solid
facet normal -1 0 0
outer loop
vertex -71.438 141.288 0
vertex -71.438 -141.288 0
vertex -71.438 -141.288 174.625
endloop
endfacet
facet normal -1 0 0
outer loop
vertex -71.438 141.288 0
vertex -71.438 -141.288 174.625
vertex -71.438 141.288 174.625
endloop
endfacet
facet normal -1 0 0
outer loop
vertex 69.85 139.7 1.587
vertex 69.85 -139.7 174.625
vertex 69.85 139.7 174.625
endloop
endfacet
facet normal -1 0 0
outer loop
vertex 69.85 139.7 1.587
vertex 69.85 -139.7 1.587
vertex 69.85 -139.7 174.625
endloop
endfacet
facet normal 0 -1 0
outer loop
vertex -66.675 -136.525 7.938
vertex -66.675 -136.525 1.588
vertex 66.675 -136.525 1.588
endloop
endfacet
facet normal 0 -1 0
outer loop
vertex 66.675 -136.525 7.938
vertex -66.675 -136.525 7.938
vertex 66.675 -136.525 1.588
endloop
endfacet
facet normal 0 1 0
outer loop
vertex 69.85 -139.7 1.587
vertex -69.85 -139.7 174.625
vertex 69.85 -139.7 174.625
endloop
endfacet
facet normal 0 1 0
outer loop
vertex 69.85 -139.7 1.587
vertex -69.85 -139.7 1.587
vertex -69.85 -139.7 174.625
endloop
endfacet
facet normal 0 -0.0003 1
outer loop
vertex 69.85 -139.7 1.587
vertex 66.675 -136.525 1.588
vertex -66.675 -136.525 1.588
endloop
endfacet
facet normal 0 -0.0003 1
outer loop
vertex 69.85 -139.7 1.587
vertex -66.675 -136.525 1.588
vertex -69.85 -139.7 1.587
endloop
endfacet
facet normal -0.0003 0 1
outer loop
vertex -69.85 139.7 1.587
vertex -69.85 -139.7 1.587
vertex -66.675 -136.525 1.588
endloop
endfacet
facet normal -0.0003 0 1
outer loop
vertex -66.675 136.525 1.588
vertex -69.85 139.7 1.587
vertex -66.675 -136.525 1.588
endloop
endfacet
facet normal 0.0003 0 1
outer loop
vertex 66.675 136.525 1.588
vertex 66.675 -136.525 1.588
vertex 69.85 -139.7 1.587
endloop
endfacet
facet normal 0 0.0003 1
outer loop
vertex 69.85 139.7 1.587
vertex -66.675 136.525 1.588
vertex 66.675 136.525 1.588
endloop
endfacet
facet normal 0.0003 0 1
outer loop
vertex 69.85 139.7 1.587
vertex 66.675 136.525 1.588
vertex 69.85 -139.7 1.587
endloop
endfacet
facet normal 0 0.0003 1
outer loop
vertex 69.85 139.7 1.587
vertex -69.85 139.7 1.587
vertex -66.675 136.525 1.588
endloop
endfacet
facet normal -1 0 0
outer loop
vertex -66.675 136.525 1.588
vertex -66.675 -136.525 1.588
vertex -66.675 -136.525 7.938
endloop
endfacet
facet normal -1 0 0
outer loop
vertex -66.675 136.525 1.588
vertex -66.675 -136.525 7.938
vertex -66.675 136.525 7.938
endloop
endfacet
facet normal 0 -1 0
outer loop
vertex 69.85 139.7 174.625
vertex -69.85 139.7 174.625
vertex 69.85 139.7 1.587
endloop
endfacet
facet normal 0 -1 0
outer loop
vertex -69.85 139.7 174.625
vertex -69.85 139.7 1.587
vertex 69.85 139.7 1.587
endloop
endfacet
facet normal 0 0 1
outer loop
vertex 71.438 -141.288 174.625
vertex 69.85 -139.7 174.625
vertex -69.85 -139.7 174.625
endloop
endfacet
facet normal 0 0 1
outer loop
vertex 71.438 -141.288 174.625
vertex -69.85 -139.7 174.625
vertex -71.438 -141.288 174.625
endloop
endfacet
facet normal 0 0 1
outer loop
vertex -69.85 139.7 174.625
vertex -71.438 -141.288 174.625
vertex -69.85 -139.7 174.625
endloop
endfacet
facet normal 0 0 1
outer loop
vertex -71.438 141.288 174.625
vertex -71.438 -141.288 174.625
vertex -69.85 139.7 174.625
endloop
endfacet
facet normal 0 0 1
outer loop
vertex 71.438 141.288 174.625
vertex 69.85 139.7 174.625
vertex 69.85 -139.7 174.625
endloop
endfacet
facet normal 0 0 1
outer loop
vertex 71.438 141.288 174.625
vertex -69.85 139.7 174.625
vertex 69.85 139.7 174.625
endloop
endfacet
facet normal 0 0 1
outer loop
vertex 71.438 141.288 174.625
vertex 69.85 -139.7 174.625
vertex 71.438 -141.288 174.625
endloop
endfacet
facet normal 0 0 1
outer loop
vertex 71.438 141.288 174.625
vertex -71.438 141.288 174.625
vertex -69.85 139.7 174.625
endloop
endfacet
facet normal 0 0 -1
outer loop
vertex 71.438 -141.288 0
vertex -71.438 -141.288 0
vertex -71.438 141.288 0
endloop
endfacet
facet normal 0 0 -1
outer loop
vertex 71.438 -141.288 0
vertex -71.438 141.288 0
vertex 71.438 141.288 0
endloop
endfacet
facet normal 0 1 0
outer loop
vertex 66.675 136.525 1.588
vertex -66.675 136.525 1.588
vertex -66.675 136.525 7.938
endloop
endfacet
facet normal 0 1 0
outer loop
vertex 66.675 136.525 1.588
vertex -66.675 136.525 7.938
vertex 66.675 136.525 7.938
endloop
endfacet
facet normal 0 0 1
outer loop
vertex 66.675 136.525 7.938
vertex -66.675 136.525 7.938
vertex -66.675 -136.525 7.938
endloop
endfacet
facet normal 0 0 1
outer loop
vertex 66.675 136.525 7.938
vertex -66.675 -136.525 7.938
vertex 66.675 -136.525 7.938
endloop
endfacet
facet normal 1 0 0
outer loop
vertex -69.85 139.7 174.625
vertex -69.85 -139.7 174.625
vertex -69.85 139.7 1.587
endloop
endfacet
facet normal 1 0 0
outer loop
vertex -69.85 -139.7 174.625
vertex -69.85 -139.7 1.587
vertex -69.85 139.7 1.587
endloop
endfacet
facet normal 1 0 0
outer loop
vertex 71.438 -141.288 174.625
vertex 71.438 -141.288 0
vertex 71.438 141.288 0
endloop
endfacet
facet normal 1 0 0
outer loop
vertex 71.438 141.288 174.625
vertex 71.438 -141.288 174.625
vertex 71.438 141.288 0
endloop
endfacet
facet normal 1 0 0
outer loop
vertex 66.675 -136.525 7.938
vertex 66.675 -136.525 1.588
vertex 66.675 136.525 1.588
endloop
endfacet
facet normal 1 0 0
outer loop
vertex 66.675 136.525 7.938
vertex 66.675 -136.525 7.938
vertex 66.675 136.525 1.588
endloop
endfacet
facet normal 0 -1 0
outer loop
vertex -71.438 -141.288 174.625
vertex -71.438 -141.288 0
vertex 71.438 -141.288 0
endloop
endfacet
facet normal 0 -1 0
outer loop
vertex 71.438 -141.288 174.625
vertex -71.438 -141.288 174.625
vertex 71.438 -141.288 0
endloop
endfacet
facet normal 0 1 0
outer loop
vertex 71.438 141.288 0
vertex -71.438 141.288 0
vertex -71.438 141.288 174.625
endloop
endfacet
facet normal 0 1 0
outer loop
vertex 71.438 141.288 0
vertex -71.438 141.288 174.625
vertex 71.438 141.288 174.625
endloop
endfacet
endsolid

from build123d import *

# Parameters (mm, degrees)
F0_W     = 142.875
F0_H     = 282.575
F1_DEPTH = 174.625
F2_T     = -1.5875
F3_W     = 133.35
F3_H     = 273.05
F4_DEPTH = 6.35


with BuildPart() as f1:
    # F0 (on Top) → F1 (new body)
    with BuildSketch(Plane.XY):
        Rectangle(F0_W, F0_H)
    extrude(amount=F1_DEPTH)

    # F2
    f2_openings = [f1.faces().sort_by_distance(p)[0] for p in [
        (0, 0, 174.625),
    ]]
    offset(amount=F2_T, openings=f2_openings)

    # F3 (on face) → F4 (join)
    with BuildSketch(Plane.XY.offset(1.5875)):
        Rectangle(F3_W, F3_H)
    extrude(amount=F4_DEPTH)


solid = f1.part
